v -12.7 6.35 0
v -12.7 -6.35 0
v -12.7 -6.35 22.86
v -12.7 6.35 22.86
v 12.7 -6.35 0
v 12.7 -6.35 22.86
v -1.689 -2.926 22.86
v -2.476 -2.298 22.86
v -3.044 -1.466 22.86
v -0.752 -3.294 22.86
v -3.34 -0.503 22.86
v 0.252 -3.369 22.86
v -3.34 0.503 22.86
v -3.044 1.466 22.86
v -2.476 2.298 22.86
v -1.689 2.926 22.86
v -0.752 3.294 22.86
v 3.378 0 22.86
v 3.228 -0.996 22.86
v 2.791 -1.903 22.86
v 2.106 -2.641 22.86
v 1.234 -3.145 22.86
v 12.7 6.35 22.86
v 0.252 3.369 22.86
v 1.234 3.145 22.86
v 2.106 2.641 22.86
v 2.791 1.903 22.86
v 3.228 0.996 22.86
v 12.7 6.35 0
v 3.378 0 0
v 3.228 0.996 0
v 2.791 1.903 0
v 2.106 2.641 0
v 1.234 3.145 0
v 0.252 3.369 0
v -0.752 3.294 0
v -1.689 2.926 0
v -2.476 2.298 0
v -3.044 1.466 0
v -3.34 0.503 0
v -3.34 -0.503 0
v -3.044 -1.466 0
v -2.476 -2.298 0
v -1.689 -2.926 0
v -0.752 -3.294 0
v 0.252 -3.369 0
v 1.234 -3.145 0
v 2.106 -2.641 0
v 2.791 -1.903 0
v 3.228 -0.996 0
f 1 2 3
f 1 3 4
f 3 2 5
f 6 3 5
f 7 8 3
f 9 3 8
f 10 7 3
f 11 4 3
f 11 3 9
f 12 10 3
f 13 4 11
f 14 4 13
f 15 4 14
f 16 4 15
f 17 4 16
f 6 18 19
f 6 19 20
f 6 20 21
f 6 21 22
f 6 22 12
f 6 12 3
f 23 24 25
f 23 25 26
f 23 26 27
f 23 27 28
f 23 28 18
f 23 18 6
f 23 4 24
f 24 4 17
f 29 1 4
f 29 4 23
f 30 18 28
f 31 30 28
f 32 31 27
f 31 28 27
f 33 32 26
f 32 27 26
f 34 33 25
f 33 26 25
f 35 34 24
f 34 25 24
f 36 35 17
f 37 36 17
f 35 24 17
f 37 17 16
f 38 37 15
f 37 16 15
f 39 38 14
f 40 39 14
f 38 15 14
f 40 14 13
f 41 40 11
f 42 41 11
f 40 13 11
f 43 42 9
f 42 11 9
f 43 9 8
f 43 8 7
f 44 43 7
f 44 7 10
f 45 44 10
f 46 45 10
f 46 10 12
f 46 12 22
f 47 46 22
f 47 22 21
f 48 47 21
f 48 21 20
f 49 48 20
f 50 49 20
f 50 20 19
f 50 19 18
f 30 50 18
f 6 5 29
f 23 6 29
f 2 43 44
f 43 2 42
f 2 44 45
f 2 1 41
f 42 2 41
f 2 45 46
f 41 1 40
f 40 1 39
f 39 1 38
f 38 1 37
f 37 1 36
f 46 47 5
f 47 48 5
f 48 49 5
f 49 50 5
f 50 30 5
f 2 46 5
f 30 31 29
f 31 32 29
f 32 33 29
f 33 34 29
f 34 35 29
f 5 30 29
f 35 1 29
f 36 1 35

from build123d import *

# Parameters (mm, degrees)
SKETCH1_W                         = 25.4
SKETCH1_H                         = 12.7
EXTRUDE1_DEPTH                    = 22.86
F_1_4_CLEARANCE_HOLE1_D           = 6.7564
F_1_4_CLEARANCE_HOLE1_ON_FACE_2_D = 6.7564


with BuildPart() as part:
    # Sketch1 → Extrude1 (new body)
    with BuildSketch(Plane.XY):
        Rectangle(SKETCH1_W, SKETCH1_H)
    extrude(amount=EXTRUDE1_DEPTH)

    # 1/4 Clearance Hole1 (through all)
    with Locations(Plane(origin=(0, 0, 0), x_dir=(-1, 0, 0), z_dir=(0, 0, -1))):
        with Locations((0, 0)):
            Hole(F_1_4_CLEARANCE_HOLE1_D / 2)

    # 1/4 Clearance Hole1 on face 2 (through all)
    with Locations(Plane.XY.offset(22.86)):
        with Locations((0, 0)):
            Hole(F_1_4_CLEARANCE_HOLE1_ON_FACE_2_D / 2)


solid = part.part
